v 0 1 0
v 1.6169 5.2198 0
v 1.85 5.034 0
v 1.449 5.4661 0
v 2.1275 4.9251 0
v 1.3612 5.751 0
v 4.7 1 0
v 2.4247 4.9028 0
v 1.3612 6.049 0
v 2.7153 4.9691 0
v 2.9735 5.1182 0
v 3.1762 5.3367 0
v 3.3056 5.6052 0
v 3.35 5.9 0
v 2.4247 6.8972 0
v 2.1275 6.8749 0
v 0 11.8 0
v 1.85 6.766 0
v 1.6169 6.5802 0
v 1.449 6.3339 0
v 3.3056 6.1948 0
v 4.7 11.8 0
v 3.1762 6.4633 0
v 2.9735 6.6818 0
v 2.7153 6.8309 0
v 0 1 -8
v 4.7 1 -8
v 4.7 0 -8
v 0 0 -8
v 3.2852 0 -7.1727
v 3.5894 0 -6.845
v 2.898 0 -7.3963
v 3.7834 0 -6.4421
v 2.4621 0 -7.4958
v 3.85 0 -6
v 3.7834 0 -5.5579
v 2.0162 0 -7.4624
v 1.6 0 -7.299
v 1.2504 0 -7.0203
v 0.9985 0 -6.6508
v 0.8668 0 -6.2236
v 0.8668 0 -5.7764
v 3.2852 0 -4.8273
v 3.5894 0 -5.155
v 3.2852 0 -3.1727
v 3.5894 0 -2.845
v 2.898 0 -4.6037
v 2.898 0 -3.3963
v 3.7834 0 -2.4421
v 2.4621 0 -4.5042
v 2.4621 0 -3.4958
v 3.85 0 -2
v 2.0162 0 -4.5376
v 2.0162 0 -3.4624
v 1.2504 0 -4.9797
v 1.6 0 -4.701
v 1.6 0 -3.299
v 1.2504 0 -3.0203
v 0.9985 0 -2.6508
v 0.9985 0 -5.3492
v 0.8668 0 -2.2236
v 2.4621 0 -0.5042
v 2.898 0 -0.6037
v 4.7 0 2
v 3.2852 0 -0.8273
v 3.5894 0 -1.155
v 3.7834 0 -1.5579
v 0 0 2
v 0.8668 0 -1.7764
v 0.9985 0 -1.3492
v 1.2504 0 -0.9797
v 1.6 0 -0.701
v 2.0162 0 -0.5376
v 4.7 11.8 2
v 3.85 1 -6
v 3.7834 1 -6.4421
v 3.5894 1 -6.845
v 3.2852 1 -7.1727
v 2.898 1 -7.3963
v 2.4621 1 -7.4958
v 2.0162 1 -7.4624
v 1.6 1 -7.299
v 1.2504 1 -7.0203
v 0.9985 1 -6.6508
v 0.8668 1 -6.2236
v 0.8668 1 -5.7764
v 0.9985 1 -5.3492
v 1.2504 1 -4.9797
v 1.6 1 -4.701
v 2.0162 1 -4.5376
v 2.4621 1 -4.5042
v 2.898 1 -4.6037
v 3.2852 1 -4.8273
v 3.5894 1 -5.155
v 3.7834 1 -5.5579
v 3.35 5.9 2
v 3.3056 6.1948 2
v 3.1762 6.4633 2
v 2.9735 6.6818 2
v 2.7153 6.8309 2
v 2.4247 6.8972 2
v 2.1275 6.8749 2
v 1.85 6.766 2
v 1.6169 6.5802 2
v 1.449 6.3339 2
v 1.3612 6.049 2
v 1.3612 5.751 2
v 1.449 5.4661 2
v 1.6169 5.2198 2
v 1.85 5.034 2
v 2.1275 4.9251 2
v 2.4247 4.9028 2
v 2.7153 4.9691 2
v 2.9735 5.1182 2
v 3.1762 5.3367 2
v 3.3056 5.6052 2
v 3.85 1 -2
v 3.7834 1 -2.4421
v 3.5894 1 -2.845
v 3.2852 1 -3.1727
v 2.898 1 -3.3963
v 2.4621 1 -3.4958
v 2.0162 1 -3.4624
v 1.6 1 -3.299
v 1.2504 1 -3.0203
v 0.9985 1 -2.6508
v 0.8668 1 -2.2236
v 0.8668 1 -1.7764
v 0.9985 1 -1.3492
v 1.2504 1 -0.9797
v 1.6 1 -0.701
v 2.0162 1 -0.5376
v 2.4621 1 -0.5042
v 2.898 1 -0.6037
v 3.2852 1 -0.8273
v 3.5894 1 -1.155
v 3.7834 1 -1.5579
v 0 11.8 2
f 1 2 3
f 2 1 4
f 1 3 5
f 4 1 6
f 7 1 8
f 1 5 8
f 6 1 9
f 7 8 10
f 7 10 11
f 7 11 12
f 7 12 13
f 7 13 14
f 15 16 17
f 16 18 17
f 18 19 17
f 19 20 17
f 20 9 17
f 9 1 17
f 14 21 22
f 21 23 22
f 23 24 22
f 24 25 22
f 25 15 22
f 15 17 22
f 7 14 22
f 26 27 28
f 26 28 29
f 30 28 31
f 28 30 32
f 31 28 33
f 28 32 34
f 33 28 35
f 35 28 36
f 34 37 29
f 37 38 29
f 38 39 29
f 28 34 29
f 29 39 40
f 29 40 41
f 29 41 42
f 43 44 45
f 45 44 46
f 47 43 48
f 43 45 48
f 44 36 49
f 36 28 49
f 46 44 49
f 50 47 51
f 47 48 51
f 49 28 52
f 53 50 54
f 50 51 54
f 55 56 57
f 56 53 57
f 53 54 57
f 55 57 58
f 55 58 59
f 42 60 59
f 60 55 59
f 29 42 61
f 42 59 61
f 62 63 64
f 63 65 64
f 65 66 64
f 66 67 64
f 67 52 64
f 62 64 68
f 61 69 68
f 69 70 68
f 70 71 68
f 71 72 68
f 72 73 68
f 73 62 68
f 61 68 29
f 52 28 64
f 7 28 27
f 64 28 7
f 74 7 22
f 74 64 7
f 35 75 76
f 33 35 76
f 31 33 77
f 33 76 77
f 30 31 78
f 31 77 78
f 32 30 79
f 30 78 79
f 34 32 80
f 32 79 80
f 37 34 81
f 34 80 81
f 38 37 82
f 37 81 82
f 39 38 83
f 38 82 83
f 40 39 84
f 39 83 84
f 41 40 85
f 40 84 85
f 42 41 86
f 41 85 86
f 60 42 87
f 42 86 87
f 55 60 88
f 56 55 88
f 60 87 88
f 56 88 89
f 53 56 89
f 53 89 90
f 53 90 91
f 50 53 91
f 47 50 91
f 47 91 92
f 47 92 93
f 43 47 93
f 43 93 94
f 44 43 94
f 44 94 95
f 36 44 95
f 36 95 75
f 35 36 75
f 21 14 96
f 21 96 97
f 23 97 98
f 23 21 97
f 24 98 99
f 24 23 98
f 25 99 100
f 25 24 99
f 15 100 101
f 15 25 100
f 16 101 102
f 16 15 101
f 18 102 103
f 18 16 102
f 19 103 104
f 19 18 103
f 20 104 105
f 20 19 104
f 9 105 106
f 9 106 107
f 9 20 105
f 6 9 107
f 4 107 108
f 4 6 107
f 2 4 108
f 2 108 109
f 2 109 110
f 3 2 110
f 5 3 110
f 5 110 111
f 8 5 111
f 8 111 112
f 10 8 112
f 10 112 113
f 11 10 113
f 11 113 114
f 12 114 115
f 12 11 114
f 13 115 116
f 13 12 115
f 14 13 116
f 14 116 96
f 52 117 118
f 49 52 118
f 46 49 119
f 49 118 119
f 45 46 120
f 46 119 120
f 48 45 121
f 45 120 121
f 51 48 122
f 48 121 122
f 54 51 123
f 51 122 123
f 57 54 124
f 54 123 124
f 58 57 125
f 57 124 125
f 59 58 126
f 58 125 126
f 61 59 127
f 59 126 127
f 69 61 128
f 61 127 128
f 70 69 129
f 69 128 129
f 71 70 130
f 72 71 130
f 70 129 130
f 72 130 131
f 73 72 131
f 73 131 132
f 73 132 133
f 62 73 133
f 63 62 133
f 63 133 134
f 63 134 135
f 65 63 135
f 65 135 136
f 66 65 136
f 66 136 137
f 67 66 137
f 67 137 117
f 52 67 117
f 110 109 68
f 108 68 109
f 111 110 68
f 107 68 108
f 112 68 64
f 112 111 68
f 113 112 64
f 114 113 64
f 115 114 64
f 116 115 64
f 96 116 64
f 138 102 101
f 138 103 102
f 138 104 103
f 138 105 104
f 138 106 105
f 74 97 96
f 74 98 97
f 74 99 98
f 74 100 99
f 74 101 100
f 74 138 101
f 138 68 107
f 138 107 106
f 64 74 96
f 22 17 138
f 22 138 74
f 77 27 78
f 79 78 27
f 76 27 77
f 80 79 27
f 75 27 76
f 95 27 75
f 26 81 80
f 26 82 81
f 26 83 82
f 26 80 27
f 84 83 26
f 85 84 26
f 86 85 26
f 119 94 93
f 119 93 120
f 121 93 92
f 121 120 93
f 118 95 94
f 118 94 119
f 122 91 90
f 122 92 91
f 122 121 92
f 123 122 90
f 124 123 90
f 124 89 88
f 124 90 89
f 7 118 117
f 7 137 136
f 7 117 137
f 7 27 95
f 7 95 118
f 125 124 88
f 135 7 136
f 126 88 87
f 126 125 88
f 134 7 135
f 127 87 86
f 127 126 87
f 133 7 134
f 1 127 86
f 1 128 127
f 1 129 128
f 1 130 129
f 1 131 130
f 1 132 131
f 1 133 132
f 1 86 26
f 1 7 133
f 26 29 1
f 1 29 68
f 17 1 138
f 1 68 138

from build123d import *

# Parameters (mm, degrees)
SKETCH1_W           = 4.7
SKETCH1_H           = 11.8
SKETCH1_R           = 1
BOSS_EXTRUDE1_DEPTH = 2
SKETCH2_W           = 4.7
SKETCH2_H           = 1
BOSS_EXTRUDE2_DEPTH = 8
SKETCH3_R           = 1.5
CUT_EXTRUDE1_DEPTH  = 8


with BuildPart() as part:
    # Sketch1 → Boss-Extrude1 (new body)
    with BuildSketch(Plane.XY):
        with Locations((2.35, 5.9)):
            Rectangle(SKETCH1_W, SKETCH1_H)
        with Locations((2.35, 5.9)):
            Circle(SKETCH1_R, mode=Mode.SUBTRACT)
    extrude(amount=BOSS_EXTRUDE1_DEPTH)

    # Sketch2 → Boss-Extrude2 (add)
    with BuildSketch(Plane(origin=(0, 0, 0), x_dir=(-1, 0, 0), z_dir=(0, 0, -1))):
        with Locations((-2.35, 0.5)):
            Rectangle(SKETCH2_W, SKETCH2_H)
    extrude(amount=BOSS_EXTRUDE2_DEPTH)

    # Sketch3 → Cut-Extrude1 (cut)
    with BuildSketch(Plane(origin=(0, 1, 0), x_dir=(1, 0, 0), z_dir=(0, 1, 0))):
        with Locations((2.35, 2)):
            Circle(SKETCH3_R)
        with Locations((2.35, 6)):
            Circle(SKETCH3_R)
    extrude(amount=-CUT_EXTRUDE1_DEPTH, mode=Mode.SUBTRACT)


solid = part.part
